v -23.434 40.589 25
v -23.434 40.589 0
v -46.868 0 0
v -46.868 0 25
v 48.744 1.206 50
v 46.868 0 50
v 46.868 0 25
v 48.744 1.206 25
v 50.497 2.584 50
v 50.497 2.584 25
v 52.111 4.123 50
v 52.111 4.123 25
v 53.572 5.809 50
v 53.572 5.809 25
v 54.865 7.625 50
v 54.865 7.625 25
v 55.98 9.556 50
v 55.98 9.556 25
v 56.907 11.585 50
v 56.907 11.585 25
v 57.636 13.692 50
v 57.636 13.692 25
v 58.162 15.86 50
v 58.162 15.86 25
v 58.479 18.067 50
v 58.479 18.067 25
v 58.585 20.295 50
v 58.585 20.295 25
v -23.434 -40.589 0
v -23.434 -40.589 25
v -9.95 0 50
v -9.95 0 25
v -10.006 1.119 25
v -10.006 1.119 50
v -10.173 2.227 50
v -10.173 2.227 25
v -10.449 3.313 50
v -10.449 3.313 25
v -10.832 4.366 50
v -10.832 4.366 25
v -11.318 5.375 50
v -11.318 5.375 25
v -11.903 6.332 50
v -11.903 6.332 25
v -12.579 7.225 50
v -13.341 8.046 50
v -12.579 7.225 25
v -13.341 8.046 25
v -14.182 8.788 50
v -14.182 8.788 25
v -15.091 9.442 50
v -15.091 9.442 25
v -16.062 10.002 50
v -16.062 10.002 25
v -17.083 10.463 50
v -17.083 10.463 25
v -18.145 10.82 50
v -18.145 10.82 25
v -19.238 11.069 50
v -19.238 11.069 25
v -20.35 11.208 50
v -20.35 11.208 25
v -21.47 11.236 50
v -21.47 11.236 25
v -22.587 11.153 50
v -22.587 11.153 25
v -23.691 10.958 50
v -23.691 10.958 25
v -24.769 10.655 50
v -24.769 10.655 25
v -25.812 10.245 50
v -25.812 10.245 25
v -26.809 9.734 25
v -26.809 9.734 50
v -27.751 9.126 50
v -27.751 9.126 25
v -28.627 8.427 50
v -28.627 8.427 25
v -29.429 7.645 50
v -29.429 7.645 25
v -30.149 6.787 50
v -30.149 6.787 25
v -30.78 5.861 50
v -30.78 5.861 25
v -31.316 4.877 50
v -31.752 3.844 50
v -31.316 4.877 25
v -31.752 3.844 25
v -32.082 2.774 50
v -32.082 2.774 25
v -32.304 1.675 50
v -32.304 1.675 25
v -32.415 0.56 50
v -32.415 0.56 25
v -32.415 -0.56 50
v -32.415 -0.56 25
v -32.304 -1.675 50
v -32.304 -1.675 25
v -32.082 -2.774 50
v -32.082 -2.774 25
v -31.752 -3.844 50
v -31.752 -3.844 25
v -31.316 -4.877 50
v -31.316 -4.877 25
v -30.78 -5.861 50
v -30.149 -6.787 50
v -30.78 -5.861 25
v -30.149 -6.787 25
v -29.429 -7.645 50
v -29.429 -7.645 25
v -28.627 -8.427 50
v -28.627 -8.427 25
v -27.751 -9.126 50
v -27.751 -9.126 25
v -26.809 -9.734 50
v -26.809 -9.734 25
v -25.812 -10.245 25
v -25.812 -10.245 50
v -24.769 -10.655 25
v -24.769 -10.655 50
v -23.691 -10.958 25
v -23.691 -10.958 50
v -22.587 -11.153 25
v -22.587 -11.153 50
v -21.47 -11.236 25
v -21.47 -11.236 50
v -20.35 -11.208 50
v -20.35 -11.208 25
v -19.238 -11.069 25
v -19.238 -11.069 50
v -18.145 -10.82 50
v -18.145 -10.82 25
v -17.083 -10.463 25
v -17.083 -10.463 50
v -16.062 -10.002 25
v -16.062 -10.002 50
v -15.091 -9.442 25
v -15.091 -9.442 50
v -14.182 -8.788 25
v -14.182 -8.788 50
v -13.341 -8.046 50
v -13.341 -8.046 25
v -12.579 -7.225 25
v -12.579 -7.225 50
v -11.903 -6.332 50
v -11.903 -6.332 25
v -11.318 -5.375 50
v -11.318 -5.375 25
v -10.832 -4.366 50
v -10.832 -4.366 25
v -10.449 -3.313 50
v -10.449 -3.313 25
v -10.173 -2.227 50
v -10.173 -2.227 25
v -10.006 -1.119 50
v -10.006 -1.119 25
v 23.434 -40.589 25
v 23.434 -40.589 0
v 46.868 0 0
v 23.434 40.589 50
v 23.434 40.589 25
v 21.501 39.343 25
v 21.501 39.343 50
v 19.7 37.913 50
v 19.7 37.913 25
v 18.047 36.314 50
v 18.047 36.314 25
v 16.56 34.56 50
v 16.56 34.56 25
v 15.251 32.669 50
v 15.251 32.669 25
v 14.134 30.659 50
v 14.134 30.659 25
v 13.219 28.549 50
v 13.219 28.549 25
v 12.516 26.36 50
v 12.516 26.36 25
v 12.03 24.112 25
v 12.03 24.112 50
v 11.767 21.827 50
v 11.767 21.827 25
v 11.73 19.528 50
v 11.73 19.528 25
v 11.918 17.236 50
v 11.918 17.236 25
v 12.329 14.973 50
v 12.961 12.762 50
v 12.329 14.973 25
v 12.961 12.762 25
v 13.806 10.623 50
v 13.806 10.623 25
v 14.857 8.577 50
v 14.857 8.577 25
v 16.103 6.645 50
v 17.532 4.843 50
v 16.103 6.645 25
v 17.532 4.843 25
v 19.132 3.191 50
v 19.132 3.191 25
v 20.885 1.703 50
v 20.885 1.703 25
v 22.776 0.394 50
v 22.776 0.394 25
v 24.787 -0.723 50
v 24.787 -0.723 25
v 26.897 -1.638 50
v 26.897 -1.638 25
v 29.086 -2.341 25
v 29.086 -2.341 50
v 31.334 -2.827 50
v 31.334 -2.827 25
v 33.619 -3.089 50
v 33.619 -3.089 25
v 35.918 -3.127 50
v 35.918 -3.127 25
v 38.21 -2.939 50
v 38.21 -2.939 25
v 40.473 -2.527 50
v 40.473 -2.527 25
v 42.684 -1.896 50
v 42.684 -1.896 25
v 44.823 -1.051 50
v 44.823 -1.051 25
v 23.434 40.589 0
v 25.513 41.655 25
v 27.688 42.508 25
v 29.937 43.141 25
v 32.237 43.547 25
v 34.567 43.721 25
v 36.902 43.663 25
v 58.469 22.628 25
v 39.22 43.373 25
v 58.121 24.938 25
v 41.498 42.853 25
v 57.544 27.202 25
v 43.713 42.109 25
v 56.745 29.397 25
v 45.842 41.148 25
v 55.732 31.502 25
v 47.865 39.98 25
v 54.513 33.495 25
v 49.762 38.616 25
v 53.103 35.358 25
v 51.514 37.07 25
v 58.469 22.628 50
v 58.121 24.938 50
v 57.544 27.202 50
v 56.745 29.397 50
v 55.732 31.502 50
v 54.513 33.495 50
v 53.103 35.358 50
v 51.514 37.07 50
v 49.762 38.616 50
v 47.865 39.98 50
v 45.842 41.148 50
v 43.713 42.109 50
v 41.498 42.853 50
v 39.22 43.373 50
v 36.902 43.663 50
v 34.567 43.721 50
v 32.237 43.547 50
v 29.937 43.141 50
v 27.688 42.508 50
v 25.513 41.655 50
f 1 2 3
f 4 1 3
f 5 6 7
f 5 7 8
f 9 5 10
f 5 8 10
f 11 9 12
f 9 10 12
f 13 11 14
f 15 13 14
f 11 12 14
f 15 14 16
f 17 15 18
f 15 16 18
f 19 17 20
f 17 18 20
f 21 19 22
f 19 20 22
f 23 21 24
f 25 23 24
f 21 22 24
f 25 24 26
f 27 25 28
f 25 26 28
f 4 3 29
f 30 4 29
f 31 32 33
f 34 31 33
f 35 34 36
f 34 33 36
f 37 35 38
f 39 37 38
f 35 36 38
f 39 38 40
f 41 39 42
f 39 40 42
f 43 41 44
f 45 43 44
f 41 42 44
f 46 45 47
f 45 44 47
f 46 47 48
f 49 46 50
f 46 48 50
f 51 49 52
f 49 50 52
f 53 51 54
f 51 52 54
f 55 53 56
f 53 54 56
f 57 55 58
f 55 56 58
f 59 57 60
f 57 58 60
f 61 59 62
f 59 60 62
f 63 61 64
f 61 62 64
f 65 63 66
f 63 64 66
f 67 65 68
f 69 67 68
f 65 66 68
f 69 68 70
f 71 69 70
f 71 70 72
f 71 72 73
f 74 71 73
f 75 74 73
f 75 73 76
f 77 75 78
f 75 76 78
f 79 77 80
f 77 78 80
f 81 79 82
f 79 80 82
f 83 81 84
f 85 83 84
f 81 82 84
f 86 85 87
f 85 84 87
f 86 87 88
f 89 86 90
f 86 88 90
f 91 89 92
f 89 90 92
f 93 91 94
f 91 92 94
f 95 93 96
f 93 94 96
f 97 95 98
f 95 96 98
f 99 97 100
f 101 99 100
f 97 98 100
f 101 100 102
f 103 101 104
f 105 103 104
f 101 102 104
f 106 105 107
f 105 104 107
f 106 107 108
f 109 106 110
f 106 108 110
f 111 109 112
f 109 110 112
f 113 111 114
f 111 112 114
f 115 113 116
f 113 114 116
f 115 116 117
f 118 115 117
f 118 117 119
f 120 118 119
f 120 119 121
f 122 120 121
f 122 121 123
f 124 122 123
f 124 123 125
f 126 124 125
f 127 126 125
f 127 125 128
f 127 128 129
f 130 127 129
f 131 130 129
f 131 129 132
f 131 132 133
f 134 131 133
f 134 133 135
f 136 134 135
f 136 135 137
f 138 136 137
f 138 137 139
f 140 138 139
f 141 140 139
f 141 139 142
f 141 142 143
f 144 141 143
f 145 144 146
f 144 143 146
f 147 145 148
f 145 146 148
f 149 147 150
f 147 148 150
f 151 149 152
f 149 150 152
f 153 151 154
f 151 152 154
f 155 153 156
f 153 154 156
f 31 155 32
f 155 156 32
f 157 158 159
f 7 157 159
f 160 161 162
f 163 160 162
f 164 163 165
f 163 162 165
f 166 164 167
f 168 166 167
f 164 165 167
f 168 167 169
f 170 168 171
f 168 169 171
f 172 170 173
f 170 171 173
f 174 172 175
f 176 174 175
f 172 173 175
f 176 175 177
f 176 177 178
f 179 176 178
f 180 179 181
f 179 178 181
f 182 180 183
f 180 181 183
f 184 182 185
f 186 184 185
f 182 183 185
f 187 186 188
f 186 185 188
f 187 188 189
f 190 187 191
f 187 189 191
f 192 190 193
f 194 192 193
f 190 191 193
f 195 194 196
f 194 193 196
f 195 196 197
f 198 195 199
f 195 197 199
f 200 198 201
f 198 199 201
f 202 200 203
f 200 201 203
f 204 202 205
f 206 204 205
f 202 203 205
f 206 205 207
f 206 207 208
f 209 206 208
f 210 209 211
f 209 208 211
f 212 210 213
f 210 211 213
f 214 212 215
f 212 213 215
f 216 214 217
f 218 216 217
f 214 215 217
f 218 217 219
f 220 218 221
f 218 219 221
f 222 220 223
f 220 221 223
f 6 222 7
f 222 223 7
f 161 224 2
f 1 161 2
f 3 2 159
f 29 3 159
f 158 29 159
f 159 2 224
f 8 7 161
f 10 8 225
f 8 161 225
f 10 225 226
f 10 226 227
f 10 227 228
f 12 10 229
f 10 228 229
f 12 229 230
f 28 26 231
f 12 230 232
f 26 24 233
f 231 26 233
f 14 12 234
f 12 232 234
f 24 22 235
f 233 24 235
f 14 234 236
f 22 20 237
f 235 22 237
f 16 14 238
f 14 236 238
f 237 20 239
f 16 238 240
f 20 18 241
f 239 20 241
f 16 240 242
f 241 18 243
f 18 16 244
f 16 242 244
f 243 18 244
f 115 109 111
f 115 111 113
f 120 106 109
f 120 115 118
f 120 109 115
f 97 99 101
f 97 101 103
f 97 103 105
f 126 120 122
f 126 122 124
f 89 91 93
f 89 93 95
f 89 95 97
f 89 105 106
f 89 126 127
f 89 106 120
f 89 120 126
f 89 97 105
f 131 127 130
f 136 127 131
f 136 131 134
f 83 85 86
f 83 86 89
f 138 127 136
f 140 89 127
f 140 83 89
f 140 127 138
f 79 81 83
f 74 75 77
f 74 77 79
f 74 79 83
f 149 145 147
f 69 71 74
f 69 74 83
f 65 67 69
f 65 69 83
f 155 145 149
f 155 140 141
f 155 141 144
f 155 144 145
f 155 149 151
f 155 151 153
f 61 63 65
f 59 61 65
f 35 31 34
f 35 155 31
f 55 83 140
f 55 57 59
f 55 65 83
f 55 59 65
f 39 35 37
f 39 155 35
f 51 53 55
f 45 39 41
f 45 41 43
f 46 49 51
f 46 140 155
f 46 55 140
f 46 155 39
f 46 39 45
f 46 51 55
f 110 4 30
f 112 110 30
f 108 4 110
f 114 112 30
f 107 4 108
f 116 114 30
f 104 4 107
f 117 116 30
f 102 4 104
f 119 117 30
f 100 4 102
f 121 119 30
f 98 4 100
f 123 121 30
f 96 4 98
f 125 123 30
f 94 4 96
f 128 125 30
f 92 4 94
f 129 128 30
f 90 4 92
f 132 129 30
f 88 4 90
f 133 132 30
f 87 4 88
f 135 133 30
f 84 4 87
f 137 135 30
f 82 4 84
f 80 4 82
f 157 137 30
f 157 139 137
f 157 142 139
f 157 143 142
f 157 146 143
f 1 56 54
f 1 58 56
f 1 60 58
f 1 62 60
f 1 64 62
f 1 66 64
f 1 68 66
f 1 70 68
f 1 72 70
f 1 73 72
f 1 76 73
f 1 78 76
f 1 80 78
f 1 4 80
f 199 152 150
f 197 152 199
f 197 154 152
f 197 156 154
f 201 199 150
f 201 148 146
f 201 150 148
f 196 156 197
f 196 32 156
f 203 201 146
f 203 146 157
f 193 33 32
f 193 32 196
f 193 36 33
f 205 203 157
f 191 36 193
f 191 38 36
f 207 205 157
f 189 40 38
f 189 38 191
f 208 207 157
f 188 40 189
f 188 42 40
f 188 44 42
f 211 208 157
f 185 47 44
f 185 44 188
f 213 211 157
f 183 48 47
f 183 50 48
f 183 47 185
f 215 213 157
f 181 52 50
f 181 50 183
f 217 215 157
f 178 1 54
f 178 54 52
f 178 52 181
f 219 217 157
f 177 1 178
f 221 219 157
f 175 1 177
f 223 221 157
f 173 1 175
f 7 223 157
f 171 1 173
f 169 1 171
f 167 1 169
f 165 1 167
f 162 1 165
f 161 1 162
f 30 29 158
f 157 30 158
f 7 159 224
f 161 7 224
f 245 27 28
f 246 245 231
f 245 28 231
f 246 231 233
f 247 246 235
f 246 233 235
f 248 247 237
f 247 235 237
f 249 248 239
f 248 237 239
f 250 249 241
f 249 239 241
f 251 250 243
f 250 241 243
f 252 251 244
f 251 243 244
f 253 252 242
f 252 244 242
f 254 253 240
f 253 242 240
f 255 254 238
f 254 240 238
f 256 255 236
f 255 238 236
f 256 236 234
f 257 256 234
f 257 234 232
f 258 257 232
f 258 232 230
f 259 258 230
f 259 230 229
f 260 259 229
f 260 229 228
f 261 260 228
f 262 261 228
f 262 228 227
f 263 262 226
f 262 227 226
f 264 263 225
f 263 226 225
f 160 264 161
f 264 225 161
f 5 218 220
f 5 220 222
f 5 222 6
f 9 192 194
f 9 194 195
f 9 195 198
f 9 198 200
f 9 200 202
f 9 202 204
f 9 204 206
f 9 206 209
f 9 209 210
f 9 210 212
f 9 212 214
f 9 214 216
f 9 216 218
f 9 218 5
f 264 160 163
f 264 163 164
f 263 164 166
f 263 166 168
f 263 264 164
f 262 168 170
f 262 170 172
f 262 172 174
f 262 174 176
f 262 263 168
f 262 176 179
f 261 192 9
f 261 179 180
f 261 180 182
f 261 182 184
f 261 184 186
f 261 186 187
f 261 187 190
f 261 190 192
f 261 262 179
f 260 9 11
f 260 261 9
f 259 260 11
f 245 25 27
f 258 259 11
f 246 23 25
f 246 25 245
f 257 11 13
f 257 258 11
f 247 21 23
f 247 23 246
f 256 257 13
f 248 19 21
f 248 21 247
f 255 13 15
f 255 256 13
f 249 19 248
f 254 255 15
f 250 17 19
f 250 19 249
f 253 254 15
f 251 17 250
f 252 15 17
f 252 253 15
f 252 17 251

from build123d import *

# Parameters (mm, degrees)
F1_DEPTH = 25
F3_DEPTH = 25
F4_R     = 11.23983
F5_DEPTH = 25


with BuildPart() as f1:
    # F0 (on Top) → F1 (new body)
    with BuildSketch(Plane.XY):
        Polygon((23.434135, 40.589113), (-23.434135, 40.589113), (-46.86827, 0), (-23.434135, -40.589113), (23.434135, -40.589113), (46.86827, 0), align=None)
    extrude(amount=F1_DEPTH)

    # F2 (on face) → F3 (join)
    with BuildSketch(Plane.XY.offset(25)):
        with BuildLine():
            Line((46.86827, 0), (23.434135, 40.589113))
            ThreePointArc((23.434135, 40.589113), (14.856646, 8.577489), (46.86827, 0))
        make_face()
        with BuildLine():
            ThreePointArc((46.86827, 0), (55.445759, 8.577489), (58.585338, 20.294556))
            ThreePointArc((58.585338, 20.294556), (46.86827, 40.589113), (23.434135, 40.589113))
            Line((23.434135, 40.589113), (46.86827, 0))
        make_face()
    extrude(amount=F3_DEPTH)

    # F4 (on face) → F5 (join)
    with BuildSketch(Plane.XY.offset(25)):
        with Locations((-21.189533, 0)):
            Circle(F4_R)
    extrude(amount=F5_DEPTH)


solid = f1.part
